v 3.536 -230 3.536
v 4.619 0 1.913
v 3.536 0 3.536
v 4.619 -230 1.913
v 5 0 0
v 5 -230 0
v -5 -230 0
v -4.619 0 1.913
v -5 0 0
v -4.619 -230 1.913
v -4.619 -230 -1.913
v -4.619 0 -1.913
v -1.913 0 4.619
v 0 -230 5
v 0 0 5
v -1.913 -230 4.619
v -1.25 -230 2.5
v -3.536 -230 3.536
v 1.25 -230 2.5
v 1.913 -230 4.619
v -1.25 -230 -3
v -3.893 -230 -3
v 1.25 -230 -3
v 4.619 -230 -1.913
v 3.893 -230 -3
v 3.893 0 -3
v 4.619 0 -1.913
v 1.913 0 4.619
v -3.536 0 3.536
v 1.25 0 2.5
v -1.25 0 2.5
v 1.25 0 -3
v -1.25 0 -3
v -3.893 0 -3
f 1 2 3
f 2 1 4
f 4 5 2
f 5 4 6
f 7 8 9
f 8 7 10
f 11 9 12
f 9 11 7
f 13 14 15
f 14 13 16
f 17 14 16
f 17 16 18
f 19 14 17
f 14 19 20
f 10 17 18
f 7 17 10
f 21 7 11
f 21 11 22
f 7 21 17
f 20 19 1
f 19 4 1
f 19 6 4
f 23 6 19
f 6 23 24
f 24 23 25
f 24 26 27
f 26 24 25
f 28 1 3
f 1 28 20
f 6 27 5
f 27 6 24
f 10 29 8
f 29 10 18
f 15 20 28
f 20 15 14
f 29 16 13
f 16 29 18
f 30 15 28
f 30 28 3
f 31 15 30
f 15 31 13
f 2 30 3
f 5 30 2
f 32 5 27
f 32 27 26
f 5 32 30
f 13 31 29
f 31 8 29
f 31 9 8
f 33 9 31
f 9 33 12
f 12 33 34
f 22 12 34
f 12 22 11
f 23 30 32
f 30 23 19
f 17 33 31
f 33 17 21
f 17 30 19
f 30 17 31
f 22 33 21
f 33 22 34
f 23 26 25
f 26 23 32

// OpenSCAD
rotate([90, 0, 0])
    difference() {
        cylinder(h = 230, r = 5);
        translate([-1.25, -5, -0.1])
            cube([2.5, 7.5, 235]);
        translate([-6, -8, -0.1])
            cube([12, 5, 235]);
    }
